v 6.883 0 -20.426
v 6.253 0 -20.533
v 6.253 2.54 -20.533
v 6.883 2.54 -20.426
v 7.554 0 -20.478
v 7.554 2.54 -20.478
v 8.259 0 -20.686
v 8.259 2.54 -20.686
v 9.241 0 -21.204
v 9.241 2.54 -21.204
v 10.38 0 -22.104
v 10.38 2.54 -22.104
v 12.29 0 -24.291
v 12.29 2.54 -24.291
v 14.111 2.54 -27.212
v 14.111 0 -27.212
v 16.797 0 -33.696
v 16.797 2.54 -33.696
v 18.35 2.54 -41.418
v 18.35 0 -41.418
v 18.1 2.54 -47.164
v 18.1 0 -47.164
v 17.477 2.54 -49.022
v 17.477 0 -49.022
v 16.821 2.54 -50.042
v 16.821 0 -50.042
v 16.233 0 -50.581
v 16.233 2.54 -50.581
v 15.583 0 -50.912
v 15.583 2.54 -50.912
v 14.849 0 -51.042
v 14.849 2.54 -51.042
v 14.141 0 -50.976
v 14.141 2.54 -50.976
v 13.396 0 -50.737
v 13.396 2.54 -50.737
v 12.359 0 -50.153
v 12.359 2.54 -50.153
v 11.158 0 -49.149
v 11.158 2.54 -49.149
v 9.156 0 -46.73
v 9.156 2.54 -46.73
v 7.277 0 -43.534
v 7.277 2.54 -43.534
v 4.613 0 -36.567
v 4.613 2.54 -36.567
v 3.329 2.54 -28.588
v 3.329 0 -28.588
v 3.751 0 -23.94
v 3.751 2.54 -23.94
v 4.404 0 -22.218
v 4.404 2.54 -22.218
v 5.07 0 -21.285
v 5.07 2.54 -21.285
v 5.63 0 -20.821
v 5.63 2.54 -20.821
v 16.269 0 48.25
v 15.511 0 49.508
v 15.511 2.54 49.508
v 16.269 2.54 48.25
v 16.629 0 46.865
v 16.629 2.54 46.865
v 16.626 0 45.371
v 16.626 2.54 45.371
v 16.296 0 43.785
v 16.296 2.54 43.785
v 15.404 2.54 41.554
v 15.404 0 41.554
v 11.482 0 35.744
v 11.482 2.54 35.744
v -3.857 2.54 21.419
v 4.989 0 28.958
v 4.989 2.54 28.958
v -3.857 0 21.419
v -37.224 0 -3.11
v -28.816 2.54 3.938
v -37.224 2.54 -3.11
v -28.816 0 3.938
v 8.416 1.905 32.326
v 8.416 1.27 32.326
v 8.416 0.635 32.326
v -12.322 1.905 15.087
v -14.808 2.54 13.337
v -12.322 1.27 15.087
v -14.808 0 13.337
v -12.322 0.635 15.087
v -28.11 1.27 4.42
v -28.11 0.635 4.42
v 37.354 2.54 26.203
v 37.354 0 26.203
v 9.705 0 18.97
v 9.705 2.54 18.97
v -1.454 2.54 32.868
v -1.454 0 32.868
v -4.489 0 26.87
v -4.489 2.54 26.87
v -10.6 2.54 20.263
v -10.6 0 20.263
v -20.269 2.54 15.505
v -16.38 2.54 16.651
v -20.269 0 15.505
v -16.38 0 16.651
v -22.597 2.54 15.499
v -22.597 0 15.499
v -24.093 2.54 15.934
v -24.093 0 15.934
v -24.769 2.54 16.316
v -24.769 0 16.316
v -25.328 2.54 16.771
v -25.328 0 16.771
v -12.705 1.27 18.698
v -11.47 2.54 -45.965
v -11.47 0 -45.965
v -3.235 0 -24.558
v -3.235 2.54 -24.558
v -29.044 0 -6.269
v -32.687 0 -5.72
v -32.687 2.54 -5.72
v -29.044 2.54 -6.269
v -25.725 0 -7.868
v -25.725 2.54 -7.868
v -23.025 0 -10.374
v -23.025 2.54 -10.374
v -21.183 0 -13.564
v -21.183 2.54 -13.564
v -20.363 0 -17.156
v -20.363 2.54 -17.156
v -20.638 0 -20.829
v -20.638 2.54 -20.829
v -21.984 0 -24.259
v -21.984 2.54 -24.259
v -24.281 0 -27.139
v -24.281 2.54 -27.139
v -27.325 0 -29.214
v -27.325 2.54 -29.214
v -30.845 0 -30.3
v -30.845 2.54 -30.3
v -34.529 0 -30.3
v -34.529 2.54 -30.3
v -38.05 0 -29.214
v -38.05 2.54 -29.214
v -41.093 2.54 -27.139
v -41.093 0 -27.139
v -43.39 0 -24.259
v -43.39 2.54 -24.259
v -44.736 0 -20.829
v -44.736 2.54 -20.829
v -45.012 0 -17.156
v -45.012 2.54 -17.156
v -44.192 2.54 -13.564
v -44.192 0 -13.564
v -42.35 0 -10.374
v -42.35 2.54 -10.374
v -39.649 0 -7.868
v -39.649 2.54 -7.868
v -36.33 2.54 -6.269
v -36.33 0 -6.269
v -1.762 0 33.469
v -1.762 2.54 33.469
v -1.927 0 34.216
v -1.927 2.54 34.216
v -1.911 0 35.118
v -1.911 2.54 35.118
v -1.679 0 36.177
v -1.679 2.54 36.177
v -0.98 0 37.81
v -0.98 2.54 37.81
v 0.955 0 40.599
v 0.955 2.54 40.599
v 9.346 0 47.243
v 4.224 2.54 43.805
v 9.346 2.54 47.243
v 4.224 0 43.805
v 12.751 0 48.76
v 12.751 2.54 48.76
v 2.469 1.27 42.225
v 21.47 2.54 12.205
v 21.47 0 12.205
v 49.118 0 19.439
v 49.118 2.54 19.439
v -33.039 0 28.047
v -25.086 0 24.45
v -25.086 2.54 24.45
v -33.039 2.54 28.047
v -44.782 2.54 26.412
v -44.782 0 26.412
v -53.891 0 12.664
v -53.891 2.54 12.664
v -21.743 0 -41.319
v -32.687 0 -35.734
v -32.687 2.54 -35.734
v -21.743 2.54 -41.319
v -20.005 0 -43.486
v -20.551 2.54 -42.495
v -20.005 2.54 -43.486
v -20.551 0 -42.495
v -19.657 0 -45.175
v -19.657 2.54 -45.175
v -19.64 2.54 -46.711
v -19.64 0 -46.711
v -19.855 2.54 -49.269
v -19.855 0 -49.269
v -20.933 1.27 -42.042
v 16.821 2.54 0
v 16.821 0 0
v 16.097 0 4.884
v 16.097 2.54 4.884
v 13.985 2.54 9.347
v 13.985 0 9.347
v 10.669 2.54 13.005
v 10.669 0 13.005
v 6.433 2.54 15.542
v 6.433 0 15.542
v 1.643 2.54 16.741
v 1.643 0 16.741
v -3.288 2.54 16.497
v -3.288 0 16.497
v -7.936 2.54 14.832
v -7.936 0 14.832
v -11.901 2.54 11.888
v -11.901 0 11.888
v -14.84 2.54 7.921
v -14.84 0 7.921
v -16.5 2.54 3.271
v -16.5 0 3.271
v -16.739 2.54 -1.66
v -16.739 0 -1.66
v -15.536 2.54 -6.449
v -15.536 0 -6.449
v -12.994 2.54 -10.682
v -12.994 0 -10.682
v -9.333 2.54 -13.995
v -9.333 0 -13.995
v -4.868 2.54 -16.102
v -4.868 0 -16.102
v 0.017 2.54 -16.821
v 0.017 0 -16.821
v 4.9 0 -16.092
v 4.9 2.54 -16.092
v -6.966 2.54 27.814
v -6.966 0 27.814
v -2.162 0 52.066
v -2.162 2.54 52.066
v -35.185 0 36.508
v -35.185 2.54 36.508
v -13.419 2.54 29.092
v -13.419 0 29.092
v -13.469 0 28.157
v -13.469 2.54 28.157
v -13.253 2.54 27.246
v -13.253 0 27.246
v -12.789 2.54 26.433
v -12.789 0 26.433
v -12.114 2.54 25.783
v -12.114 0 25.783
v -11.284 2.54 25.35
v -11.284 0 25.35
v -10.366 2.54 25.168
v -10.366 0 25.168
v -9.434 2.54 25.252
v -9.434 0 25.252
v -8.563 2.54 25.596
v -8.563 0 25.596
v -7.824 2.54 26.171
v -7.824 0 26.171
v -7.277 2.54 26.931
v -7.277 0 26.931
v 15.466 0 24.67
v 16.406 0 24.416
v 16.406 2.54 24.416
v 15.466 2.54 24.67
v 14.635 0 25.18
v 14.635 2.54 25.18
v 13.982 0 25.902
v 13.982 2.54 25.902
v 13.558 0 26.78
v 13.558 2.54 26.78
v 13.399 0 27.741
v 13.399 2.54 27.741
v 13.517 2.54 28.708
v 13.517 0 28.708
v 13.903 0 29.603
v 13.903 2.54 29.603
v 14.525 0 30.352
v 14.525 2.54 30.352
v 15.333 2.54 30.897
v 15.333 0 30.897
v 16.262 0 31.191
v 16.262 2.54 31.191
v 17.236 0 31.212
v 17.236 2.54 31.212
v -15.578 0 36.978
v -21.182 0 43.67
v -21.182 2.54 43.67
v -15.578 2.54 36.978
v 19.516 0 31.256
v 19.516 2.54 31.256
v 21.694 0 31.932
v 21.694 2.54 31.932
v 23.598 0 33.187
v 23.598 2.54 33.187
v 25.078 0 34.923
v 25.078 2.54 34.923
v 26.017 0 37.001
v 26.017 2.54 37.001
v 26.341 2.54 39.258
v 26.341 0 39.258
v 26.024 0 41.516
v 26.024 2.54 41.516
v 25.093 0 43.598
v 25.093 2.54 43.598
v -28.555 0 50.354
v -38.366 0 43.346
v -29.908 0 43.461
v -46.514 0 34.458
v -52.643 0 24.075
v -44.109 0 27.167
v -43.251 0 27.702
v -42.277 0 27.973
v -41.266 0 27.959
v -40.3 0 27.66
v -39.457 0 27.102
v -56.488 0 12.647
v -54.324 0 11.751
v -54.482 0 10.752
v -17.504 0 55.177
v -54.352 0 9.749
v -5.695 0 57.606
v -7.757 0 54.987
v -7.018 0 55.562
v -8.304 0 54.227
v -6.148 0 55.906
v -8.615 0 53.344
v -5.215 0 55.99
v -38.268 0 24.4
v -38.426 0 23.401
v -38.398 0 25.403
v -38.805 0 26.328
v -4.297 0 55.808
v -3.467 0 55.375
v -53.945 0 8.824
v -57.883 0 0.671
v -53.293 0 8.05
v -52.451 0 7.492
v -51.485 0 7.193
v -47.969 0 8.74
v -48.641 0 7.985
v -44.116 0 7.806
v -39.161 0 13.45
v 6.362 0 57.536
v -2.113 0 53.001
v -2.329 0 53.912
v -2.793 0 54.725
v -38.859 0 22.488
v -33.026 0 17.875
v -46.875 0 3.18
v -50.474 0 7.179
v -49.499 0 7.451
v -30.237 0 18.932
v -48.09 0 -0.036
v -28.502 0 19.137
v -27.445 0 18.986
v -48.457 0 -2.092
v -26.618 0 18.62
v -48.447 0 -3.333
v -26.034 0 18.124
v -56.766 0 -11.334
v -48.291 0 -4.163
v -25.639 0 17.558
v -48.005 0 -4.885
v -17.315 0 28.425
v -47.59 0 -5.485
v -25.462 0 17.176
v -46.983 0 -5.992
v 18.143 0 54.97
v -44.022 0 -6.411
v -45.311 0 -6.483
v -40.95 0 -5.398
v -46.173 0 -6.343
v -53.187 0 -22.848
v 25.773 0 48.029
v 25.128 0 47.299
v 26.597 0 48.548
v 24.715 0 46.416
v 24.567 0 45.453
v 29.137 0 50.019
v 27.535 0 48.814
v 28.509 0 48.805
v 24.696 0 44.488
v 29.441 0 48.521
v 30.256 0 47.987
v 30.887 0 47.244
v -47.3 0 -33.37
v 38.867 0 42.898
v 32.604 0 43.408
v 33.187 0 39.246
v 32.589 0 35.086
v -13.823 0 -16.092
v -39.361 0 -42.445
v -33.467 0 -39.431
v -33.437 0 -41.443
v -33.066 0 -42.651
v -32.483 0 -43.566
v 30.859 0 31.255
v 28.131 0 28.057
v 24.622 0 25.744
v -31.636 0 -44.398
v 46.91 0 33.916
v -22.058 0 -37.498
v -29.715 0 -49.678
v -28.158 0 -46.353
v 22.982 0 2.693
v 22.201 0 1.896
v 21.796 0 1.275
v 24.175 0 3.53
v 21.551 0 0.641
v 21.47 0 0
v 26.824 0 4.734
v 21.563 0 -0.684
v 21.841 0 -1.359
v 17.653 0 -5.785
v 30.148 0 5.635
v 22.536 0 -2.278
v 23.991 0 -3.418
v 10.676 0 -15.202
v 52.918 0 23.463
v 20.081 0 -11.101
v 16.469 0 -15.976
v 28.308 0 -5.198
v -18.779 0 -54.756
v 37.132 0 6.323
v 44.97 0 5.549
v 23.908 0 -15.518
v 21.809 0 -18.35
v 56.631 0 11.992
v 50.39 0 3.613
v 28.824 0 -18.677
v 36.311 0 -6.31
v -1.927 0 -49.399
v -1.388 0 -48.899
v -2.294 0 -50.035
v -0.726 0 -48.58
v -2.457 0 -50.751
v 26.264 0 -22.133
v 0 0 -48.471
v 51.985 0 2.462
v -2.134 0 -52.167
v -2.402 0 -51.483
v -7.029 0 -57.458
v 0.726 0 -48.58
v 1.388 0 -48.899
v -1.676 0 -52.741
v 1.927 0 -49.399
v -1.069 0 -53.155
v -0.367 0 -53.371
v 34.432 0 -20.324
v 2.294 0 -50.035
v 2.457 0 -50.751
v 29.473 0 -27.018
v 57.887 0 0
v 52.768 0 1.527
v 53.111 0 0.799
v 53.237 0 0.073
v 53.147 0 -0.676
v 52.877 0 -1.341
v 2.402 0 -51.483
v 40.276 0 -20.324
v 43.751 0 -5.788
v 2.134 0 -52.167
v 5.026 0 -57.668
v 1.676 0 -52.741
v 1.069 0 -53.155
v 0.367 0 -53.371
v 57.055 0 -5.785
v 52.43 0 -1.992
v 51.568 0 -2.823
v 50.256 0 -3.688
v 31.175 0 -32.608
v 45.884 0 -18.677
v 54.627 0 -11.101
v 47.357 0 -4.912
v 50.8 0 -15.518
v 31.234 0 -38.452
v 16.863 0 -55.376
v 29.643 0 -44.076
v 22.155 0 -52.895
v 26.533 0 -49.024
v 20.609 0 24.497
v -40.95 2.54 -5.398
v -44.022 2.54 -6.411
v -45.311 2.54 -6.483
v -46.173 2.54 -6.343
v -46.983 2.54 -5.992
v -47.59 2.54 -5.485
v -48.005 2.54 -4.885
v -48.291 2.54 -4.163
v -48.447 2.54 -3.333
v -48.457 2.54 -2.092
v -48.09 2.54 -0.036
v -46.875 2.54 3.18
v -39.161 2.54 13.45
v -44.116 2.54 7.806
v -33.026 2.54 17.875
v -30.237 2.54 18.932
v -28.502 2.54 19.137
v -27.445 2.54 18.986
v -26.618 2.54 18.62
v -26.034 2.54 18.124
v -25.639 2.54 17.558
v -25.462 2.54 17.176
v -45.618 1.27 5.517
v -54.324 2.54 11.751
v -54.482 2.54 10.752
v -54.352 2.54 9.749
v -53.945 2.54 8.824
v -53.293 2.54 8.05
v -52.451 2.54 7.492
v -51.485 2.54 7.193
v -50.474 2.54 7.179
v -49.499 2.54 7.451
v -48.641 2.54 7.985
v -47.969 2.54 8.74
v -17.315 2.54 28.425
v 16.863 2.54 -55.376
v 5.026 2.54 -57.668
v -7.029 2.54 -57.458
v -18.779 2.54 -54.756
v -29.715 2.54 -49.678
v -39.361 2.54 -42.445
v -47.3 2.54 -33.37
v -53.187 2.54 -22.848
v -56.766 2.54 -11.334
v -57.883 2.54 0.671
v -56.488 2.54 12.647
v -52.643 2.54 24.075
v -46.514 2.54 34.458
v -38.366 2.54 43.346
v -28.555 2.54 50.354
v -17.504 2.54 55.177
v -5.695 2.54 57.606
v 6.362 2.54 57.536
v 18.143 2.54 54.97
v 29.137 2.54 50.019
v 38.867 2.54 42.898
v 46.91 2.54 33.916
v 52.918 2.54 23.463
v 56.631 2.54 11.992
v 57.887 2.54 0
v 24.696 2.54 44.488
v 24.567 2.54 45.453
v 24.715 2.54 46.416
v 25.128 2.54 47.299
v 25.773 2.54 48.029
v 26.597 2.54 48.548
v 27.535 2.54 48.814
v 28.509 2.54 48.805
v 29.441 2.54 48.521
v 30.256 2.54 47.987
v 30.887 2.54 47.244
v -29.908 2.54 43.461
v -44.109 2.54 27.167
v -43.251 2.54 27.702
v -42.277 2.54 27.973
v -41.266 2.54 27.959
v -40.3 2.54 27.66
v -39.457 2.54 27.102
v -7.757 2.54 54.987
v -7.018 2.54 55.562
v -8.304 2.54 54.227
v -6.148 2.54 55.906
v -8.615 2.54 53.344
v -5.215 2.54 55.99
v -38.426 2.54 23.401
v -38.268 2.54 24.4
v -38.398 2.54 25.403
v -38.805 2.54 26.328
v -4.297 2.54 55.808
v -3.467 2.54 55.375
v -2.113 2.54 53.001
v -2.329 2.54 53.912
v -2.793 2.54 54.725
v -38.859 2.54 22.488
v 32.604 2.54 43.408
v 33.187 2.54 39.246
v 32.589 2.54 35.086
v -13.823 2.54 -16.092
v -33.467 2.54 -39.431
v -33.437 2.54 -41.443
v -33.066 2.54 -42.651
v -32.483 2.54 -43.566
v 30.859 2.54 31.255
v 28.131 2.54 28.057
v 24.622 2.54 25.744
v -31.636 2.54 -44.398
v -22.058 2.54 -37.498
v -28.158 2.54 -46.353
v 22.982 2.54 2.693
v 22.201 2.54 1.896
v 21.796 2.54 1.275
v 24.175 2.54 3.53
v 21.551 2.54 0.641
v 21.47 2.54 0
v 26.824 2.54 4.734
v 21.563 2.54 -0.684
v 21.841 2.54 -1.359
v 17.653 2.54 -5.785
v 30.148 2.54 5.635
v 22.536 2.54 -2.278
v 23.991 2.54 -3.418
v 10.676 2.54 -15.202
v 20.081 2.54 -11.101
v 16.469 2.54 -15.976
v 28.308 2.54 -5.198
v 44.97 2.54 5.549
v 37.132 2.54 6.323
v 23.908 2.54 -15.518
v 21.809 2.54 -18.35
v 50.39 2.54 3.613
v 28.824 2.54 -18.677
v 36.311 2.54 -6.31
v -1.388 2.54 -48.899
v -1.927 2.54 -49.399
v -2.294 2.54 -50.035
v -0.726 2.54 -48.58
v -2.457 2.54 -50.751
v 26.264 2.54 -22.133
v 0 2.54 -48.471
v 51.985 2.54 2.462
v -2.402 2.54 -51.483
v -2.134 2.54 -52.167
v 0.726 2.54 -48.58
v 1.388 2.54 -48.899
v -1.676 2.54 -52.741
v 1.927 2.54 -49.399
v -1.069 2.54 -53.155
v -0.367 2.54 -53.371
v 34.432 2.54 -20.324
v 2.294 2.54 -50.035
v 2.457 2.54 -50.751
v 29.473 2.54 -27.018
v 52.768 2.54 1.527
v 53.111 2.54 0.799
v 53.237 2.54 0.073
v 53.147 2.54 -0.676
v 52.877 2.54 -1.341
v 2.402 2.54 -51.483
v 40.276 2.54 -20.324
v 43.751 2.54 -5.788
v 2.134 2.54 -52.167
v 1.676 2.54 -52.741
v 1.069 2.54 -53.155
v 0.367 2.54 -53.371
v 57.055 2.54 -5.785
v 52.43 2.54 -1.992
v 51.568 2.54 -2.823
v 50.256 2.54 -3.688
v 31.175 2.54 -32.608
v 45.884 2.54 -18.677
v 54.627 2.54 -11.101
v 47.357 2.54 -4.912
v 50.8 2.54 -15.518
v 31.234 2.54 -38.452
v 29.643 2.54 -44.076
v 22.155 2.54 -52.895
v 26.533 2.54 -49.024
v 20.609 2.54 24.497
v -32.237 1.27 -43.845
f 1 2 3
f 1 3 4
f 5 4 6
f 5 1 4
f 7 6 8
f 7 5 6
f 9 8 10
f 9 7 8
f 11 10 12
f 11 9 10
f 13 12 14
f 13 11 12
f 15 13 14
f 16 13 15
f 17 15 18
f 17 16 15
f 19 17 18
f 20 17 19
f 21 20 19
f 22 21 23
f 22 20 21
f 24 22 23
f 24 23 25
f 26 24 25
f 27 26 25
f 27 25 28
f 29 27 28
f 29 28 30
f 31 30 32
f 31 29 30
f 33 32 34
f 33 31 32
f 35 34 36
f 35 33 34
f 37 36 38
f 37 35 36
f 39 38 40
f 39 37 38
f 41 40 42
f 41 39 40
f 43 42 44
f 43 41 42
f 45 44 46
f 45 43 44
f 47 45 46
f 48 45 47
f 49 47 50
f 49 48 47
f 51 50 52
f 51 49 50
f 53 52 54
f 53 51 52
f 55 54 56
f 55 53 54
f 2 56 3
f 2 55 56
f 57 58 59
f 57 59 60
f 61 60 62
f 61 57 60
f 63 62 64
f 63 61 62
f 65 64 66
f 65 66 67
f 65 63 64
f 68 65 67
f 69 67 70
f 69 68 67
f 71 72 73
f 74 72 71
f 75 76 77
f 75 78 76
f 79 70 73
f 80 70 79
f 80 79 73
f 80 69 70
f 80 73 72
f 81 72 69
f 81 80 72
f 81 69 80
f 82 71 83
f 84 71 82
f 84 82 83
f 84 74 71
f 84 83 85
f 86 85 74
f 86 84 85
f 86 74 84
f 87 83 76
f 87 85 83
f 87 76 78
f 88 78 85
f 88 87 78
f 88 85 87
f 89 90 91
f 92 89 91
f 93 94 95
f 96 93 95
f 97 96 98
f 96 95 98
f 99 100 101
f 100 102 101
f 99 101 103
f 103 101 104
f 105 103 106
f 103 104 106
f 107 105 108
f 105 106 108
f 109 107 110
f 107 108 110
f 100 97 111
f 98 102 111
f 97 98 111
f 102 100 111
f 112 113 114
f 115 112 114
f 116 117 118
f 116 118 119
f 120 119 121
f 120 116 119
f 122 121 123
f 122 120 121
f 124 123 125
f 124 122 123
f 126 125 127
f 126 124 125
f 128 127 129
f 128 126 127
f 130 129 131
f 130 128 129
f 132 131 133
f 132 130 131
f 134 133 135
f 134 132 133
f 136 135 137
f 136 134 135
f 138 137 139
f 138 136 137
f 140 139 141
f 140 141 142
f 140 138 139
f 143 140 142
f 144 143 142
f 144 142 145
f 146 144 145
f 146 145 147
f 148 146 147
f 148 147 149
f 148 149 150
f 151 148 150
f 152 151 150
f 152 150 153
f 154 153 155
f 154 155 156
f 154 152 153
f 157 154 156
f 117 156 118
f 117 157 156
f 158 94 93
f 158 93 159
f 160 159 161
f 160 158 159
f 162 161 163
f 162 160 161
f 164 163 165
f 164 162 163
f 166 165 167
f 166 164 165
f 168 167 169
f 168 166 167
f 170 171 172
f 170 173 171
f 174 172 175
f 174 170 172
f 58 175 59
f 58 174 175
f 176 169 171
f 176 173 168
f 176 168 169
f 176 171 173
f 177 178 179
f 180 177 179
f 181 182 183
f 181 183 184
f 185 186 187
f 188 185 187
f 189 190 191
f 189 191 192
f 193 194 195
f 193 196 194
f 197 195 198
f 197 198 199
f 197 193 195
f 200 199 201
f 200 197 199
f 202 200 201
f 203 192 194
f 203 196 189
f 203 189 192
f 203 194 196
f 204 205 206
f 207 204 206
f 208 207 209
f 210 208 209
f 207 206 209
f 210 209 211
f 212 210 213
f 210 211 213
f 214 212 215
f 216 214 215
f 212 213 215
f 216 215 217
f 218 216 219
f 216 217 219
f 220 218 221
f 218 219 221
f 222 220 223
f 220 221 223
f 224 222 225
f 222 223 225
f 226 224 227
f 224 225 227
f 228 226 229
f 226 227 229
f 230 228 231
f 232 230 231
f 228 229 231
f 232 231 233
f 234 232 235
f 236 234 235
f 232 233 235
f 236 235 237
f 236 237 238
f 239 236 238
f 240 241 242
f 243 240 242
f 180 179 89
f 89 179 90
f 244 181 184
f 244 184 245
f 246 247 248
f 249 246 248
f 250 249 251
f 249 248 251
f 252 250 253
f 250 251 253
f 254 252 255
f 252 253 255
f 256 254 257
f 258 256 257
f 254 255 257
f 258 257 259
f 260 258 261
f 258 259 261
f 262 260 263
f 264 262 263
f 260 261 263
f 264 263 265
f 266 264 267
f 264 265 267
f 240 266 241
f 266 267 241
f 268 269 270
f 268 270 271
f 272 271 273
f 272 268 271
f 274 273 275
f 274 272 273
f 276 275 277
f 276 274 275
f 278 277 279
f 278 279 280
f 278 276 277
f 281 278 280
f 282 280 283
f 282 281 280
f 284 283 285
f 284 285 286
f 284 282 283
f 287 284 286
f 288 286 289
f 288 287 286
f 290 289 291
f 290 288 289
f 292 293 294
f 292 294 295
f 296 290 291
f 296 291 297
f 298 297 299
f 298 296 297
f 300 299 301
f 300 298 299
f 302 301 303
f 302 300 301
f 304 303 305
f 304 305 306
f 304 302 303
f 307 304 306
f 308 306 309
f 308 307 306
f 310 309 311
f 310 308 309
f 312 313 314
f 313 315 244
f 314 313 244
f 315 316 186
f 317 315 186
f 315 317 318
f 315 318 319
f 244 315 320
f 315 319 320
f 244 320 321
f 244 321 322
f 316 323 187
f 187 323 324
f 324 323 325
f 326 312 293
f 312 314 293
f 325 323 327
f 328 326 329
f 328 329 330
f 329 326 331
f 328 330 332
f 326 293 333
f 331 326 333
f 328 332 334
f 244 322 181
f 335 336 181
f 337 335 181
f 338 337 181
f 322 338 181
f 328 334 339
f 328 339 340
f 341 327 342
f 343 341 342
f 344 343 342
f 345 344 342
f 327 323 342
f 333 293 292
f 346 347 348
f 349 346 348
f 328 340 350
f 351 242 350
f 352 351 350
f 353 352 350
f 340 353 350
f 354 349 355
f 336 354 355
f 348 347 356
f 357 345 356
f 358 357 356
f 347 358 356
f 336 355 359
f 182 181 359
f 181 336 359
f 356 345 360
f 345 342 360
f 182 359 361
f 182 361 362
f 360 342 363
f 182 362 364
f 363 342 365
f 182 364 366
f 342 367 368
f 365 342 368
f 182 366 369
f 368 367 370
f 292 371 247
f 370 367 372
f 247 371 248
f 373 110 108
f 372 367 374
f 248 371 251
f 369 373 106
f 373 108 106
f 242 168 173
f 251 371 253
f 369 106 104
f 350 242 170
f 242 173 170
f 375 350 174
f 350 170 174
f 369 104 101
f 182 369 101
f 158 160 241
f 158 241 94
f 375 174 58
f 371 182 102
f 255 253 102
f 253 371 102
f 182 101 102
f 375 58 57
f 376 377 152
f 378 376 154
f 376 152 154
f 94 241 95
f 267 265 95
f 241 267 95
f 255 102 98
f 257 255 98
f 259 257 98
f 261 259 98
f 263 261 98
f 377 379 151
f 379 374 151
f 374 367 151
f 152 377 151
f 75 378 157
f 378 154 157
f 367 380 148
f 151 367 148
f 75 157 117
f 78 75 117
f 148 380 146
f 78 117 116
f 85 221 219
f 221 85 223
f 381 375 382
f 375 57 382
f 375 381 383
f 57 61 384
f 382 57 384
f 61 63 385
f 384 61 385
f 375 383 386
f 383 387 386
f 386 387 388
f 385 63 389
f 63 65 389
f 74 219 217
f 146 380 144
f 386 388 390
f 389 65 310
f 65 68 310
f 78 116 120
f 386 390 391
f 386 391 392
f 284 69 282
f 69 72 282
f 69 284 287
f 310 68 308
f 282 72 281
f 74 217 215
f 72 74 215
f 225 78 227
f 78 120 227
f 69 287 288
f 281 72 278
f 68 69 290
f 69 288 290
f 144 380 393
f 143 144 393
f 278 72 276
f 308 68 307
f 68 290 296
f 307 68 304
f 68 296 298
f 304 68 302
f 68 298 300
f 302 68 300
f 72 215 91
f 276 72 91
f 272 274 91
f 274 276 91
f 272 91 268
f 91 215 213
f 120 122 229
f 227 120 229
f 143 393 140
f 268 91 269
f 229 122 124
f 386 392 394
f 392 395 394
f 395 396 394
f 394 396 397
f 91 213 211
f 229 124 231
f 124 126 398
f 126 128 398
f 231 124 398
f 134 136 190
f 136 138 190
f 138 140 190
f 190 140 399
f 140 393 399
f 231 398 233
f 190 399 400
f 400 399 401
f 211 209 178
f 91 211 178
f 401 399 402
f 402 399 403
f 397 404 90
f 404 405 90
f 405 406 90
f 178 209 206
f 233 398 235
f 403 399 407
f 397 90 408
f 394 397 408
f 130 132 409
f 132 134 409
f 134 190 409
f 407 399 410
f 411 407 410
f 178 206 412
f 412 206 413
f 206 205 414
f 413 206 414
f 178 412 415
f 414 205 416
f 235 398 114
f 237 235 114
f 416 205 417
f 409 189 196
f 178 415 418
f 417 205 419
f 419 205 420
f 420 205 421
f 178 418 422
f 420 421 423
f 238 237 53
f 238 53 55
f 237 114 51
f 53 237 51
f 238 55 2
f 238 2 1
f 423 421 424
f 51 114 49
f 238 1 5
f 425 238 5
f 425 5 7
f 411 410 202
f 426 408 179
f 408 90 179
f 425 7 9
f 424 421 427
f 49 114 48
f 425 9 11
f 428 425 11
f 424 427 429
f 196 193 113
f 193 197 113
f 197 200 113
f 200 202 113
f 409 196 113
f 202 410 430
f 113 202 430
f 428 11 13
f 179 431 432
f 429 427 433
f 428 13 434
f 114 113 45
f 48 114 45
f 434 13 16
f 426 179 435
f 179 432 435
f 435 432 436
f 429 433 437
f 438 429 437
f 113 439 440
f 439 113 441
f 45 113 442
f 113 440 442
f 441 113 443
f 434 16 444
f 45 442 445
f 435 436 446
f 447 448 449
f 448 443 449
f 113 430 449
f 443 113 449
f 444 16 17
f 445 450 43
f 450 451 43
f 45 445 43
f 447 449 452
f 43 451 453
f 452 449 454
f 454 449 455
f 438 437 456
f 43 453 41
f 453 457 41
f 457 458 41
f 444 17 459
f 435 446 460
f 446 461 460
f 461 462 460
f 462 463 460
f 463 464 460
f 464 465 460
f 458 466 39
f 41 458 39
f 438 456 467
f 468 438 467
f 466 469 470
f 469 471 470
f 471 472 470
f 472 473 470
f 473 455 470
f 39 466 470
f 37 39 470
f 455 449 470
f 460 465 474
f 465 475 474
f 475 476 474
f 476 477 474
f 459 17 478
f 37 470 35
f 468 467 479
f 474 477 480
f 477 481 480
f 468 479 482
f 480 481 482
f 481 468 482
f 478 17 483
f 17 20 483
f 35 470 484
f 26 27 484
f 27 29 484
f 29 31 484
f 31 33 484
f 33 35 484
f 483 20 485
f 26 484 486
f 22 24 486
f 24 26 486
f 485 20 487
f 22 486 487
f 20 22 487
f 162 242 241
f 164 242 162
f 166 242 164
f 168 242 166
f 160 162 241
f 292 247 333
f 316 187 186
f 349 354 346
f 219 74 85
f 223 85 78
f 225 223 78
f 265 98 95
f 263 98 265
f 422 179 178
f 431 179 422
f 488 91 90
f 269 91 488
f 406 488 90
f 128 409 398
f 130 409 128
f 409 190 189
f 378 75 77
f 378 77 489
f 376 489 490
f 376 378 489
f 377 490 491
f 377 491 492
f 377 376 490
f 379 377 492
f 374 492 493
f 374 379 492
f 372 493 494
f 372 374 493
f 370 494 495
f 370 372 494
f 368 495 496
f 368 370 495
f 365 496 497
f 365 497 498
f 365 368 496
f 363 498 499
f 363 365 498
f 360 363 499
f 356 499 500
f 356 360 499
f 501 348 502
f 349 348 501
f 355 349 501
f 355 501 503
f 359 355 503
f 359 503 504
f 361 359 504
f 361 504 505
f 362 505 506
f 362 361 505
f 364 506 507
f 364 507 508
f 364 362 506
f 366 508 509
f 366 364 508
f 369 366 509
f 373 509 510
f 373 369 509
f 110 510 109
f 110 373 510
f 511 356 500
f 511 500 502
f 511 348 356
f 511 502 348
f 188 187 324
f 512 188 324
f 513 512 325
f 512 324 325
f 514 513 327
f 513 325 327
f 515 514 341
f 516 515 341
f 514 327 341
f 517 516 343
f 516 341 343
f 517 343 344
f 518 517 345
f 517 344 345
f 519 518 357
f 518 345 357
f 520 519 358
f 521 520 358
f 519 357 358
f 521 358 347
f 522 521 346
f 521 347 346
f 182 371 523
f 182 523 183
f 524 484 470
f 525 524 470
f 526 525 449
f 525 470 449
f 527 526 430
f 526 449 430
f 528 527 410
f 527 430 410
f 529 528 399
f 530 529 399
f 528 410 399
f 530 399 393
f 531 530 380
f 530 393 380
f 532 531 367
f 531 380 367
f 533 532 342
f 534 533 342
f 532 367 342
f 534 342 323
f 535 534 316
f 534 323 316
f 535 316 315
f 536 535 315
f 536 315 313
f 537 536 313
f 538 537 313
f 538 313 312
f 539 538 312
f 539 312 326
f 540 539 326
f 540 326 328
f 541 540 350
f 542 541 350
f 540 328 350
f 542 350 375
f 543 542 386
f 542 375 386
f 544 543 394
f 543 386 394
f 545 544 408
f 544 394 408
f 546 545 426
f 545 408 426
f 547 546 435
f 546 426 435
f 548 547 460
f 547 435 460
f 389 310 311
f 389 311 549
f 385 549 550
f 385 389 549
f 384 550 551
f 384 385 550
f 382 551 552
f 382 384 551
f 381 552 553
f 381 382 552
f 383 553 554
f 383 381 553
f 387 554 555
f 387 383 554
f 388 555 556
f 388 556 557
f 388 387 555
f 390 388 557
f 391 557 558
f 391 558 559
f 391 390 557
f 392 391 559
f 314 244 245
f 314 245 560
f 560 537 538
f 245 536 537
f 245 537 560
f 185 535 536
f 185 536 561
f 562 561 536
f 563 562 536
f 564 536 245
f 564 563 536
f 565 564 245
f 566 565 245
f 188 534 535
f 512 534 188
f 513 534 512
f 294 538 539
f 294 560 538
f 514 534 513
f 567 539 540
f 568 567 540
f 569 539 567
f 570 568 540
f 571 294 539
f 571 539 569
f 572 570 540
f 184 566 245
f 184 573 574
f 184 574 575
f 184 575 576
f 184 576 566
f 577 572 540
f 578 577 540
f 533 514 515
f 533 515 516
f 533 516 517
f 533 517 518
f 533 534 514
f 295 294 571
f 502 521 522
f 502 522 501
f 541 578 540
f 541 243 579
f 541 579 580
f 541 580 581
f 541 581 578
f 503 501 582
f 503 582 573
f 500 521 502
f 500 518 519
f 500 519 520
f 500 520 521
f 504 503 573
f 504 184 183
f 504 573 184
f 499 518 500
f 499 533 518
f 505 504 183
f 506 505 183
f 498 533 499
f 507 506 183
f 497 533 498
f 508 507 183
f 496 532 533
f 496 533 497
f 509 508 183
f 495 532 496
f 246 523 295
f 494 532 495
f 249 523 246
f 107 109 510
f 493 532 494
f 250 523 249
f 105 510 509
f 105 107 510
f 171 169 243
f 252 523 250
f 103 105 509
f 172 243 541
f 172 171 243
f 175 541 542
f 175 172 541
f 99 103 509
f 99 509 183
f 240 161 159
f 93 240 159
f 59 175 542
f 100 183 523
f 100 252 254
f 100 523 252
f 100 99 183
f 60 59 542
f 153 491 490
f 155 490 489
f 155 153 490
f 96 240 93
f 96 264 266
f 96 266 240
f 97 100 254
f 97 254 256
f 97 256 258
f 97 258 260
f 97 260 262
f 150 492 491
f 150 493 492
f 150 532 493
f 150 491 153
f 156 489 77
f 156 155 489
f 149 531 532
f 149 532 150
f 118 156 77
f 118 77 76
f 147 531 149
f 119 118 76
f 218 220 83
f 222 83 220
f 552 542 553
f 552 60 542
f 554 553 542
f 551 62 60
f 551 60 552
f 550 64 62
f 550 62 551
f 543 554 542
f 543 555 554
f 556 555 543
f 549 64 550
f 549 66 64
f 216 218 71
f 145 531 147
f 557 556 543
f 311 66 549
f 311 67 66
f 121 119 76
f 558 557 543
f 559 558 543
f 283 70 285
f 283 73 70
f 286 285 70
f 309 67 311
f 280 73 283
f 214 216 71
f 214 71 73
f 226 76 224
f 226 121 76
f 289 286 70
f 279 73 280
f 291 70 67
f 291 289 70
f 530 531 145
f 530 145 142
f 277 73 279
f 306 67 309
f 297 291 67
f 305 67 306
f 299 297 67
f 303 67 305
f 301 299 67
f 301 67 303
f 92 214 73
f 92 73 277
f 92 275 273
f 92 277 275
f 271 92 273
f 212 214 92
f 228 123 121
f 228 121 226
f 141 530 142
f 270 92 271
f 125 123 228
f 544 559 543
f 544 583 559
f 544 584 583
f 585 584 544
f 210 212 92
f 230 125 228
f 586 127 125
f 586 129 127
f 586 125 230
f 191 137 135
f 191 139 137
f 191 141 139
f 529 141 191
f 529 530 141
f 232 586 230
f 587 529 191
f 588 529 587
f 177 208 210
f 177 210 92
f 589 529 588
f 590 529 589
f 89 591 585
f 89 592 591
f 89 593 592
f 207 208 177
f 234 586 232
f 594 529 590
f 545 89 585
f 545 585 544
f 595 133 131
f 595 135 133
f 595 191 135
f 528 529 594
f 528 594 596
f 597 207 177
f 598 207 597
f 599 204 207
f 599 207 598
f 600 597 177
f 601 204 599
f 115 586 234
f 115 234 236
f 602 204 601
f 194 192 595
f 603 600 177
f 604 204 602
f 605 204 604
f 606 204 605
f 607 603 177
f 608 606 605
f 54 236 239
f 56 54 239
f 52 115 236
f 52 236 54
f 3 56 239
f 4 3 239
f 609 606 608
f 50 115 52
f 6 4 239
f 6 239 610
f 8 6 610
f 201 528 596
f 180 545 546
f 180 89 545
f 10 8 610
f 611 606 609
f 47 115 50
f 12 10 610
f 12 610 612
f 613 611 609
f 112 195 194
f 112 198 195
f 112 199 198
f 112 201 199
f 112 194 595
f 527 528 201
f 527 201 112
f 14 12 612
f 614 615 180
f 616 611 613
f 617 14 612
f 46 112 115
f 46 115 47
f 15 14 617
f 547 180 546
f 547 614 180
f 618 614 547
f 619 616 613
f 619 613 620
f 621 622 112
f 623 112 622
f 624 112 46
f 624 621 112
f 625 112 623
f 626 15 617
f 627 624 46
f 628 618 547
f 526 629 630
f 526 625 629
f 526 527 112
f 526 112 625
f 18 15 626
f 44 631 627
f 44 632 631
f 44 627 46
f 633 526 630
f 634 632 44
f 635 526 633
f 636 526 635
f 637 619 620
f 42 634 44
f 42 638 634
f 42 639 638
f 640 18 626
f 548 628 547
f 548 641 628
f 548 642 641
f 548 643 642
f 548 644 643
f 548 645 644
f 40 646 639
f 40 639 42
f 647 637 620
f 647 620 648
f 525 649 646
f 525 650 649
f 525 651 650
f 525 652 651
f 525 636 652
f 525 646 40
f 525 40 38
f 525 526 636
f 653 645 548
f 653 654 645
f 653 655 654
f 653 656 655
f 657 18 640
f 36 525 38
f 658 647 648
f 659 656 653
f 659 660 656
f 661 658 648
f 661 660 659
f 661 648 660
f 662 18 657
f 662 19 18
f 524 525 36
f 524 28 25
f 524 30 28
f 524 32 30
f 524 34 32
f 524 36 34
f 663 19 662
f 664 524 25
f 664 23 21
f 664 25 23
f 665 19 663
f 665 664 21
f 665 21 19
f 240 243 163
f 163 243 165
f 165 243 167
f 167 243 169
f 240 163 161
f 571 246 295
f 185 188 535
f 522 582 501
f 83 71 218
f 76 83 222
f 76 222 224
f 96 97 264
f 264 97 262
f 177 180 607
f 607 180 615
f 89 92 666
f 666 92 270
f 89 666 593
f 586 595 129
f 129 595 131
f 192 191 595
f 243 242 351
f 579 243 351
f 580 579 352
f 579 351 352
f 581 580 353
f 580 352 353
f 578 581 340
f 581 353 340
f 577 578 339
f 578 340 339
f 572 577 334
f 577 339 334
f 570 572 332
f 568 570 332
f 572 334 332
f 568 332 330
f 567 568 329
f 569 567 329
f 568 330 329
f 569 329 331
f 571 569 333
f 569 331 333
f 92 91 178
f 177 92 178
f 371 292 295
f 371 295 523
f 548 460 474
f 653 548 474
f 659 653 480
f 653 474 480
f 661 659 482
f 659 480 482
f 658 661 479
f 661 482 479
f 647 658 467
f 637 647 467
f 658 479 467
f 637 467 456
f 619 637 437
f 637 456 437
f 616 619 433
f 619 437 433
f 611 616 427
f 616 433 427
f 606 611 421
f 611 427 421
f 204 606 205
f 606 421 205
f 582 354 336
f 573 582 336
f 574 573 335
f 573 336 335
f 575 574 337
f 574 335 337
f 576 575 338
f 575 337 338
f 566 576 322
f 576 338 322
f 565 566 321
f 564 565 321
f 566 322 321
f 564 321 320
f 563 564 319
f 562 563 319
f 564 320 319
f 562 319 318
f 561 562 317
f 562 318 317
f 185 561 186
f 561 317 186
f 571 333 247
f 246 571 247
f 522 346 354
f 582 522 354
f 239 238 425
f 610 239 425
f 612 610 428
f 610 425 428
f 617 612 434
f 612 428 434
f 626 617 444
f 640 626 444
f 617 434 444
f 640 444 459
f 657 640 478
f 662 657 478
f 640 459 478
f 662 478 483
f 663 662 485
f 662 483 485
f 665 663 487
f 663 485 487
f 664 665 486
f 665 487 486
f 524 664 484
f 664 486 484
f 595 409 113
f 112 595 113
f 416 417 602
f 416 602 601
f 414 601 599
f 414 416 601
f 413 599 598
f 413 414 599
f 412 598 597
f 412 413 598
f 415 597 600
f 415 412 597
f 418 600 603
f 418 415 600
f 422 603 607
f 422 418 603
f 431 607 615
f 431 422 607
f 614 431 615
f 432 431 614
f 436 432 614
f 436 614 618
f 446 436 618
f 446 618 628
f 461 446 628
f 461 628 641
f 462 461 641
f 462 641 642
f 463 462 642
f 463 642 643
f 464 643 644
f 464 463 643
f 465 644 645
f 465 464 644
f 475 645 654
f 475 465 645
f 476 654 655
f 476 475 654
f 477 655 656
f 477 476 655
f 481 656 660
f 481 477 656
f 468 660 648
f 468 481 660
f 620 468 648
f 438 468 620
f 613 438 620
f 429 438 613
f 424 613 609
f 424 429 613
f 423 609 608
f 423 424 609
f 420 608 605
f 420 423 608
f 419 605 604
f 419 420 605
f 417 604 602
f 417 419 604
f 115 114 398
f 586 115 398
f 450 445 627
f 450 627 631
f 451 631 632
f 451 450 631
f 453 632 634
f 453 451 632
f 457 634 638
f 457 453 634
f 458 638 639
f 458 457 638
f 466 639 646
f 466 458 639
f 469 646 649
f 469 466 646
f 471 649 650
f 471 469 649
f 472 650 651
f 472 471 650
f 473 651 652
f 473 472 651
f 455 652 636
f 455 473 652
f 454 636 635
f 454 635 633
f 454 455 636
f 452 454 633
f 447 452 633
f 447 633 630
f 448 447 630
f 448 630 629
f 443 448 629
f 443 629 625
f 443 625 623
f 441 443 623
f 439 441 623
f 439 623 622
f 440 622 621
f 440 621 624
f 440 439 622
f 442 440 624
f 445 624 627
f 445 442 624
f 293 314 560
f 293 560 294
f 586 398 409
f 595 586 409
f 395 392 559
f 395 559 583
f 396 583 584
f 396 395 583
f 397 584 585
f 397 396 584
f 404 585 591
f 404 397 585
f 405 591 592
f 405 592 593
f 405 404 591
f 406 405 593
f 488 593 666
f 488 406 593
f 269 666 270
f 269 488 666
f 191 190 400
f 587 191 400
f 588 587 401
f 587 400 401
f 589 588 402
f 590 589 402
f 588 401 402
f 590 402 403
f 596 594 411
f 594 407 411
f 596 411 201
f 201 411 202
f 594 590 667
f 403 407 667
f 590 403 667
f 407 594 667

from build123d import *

# Parameters (mm, degrees)
SKETCH3_R           = 12.358895311
SKETCH3_R_2         = 2.464097651
SKETCH3_RX          = 15.890344847
SKETCH3_RY          = 6.252747063
SKETCH3_RX_2        = 15.884289383
SKETCH3_RY_2        = 6.323263158
BOSS_EXTRUDE3_DEPTH = 2.54


with BuildPart() as part:
    # Sketch3 → Boss-Extrude3 (new body)
    with BuildSketch(Plane(origin=(0, 0, 0), x_dir=(1, 0, 0), z_dir=(0, 1, 0))):
        with BuildLine():
            ThreePointArc((16.863436343, 55.375878801), (-46.513606384, -34.457914322), (57.886643004, 0))
            ThreePointArc((57.886643004, 0), (37.353973593, 20.532669411), (16.821304183, 0))
            ThreePointArc((16.821304183, 0), (-13.51640864, -10.013139962), (4.900353131, 16.091700146))
            ThreePointArc((4.900353131, 16.091700146), (30.523984064, 29.752247868), (16.863436343, 55.375878801))
        make_face()
        with Locations(Location((-32.68730189, 18.079259895, 0), (0, 0, 270))):
            Circle(SKETCH3_R, mode=Mode.SUBTRACT)
        with Locations(Location((0, 50.934909537, 0), (0, 0, 270))):
            Circle(SKETCH3_R_2, mode=Mode.SUBTRACT)
        with Locations(Location((10.881894737, 35.733789474), (0, 0, -106.936895049))):
            Ellipse(SKETCH3_RX, SKETCH3_RY, mode=Mode.SUBTRACT)
        with Locations(Location((37.353973593, 0), (0, 0, 180))):
            Ellipse(SKETCH3_RX_2, SKETCH3_RY_2, mode=Mode.SUBTRACT)
        Polygon((-11.470105263, 45.96451038), (-3.235157895, 24.557789474), (-13.822947368, 16.091700146), (-22.057894737, 37.498421053), align=None, mode=Mode.SUBTRACT)
        Polygon((21.469684211, -12.205368421), (49.11818412, -19.439027927), (37.353973593, -26.203448979), (9.705473684, -18.969789474), align=None, mode=Mode.SUBTRACT)
        Polygon((-17.315479632, -28.424679662), (-25.08637222, -24.449858293), (-33.039084983, -28.047126178), (-35.185063006, -36.507667228), (-29.908341066, -43.46052147), (-21.18239841, -43.670047846), (-15.578047835, -36.978468722), align=None, mode=Mode.SUBTRACT)
        with BuildLine():
            Line((-44.781699634, -26.412027794), (-53.891075692, -12.664426795))
            ThreePointArc((-53.891075692, -12.664426795), (-52.891997, -7.741009102), (-47.968579306, -8.740087794))
            Line((-47.968579306, -8.740087794), (-38.859203248, -22.487688793))
            ThreePointArc((-38.859203248, -22.487688793), (-39.85828194, -27.411106486), (-44.781699634, -26.412027794))
        make_face(mode=Mode.SUBTRACT)
        with BuildLine():
            Line((-6.966070099, -27.813792225), (-2.161956477, -52.065958521))
            ThreePointArc((-2.161956477, -52.065958521), (-4.749380107, -55.931687729), (-8.615109315, -53.344264099))
            Line((-8.615109315, -53.344264099), (-13.419222937, -29.092097803))
            ThreePointArc((-13.419222937, -29.092097803), (-10.831799307, -25.226368595), (-6.966070099, -27.813792225))
        make_face(mode=Mode.SUBTRACT)
        with BuildLine():
            ThreePointArc((30.886886149, -47.244480889), (30.858829329, -31.255415741), (16.406418198, -24.415912541))
            ThreePointArc((16.406418198, -24.415912541), (13.423424498, -28.22867821), (17.236190167, -31.21167191))
            ThreePointArc((17.236190167, -31.21167191), (25.077566237, -34.922548678), (25.092788893, -43.597659821))
            ThreePointArc((25.092788893, -43.597659821), (26.166426987, -48.318118983), (30.886886149, -47.244480889))
        make_face(mode=Mode.SUBTRACT)
        with BuildLine():
            add(Edge.make_bspline(
                [(-37.224246313, 3.110438823), (-61.658549034, 21.290294434), (-45.618310828, -5.517015367), (-29.578072621, -32.324325169), (-25.327826736, -16.771498154)],
                knots=[5.191011334, 5.191011334, 5.191011334, 7.442291905, 7.442291905, 9.693572477, 9.693572477, 9.693572477], degree=2, weights=[1, 0.43059872, 1, 0.43059872, 1]))
            add(Edge.make_bspline(
                [(-1.454023545, -32.868118691), (-10.929764001, -2.855902976), (-25.327826736, -16.771498154)],
                knots=[3.935097044, 3.935097044, 3.935097044, 6.283185307, 6.283185307, 6.283185307], degree=2, weights=[1, 0.386424867, 1]))
            add(Edge.make_bspline(
                [(-1.454023545, -32.868118691), (-9.856799006, -45.028908521), (15.51104241, -49.507809486)],
                knots=[0, 0, 0, 2.383739829, 2.383739829, 2.383739829], degree=2, weights=[1, 0.369923253, 1]))
            add(Edge.make_bspline(
                [(15.51104241, -49.507809486), (25.653042134, -37.078339164), (-27.805109675, -3.440180976), (-27.805109675, -6.510884213), (-37.224246313, 3.110438823)],
                knots=[0, 0, 0, 0, 0, 1, 1, 1, 1, 1], degree=4))
        make_face(mode=Mode.SUBTRACT)
        with BuildLine():
            add(Edge.make_bspline(
                [(-32.68730189, 35.733789474), (-35.185063006, 44.509042558), (-19.85530503, 49.26893673)],
                knots=[0, 0, 0, 1, 1, 1], degree=2, weights=[1, 2.02313102, 1]))
            add(Edge.make_bspline(
                [(-32.68730189, 35.733789474), (-19.000257161, 41.875909611), (-19.85530503, 49.26893673)],
                knots=[0, 0, 0, 1, 1, 1], degree=2, weights=[1, 2.762803935, 1]))
        make_face(mode=Mode.SUBTRACT)
    extrude(amount=BOSS_EXTRUDE3_DEPTH)


solid = part.part
